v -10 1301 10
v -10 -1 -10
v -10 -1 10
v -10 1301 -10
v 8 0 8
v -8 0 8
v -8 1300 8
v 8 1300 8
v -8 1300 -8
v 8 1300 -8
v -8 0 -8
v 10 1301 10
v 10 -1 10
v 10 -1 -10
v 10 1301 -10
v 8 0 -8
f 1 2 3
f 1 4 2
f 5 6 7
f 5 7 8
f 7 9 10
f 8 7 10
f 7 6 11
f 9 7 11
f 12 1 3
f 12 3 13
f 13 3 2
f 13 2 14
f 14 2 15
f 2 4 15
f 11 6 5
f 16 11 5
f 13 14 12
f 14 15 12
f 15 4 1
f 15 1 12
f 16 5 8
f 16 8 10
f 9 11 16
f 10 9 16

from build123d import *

# Parameters (mm, degrees)
SKETCH1_W           = 20
SKETCH1_H           = 20
SKETCH1_W_2         = 16
SKETCH1_H_2         = 16
BOSS_EXTRUDE1_DEPTH = 1300
SKETCH2_W           = 20
SKETCH2_H           = 20
BOSS_EXTRUDE2_DEPTH = 1
SKETCH3_W           = 20
SKETCH3_H           = 20
BOSS_EXTRUDE3_DEPTH = 1


with BuildPart() as part:
    # Sketch1 → Boss-Extrude1 (new body)
    with BuildSketch(Plane(origin=(0, 0, 0), x_dir=(1, 0, 0), z_dir=(0, 1, 0))):
        Rectangle(SKETCH1_W, SKETCH1_H)
        Rectangle(SKETCH1_W_2, SKETCH1_H_2, mode=Mode.SUBTRACT)
    extrude(amount=BOSS_EXTRUDE1_DEPTH)

    # Sketch2 → Boss-Extrude2 (add)
    with BuildSketch(Plane(origin=(0, 1300, 0), x_dir=(1, 0, 0), z_dir=(0, 1, 0))):
        Rectangle(SKETCH2_W, SKETCH2_H)
    extrude(amount=BOSS_EXTRUDE2_DEPTH)

    # Sketch3 → Boss-Extrude3 (add)
    with BuildSketch(Plane.XZ):
        Rectangle(SKETCH3_W, SKETCH3_H)
    extrude(amount=BOSS_EXTRUDE3_DEPTH)


solid = part.part
